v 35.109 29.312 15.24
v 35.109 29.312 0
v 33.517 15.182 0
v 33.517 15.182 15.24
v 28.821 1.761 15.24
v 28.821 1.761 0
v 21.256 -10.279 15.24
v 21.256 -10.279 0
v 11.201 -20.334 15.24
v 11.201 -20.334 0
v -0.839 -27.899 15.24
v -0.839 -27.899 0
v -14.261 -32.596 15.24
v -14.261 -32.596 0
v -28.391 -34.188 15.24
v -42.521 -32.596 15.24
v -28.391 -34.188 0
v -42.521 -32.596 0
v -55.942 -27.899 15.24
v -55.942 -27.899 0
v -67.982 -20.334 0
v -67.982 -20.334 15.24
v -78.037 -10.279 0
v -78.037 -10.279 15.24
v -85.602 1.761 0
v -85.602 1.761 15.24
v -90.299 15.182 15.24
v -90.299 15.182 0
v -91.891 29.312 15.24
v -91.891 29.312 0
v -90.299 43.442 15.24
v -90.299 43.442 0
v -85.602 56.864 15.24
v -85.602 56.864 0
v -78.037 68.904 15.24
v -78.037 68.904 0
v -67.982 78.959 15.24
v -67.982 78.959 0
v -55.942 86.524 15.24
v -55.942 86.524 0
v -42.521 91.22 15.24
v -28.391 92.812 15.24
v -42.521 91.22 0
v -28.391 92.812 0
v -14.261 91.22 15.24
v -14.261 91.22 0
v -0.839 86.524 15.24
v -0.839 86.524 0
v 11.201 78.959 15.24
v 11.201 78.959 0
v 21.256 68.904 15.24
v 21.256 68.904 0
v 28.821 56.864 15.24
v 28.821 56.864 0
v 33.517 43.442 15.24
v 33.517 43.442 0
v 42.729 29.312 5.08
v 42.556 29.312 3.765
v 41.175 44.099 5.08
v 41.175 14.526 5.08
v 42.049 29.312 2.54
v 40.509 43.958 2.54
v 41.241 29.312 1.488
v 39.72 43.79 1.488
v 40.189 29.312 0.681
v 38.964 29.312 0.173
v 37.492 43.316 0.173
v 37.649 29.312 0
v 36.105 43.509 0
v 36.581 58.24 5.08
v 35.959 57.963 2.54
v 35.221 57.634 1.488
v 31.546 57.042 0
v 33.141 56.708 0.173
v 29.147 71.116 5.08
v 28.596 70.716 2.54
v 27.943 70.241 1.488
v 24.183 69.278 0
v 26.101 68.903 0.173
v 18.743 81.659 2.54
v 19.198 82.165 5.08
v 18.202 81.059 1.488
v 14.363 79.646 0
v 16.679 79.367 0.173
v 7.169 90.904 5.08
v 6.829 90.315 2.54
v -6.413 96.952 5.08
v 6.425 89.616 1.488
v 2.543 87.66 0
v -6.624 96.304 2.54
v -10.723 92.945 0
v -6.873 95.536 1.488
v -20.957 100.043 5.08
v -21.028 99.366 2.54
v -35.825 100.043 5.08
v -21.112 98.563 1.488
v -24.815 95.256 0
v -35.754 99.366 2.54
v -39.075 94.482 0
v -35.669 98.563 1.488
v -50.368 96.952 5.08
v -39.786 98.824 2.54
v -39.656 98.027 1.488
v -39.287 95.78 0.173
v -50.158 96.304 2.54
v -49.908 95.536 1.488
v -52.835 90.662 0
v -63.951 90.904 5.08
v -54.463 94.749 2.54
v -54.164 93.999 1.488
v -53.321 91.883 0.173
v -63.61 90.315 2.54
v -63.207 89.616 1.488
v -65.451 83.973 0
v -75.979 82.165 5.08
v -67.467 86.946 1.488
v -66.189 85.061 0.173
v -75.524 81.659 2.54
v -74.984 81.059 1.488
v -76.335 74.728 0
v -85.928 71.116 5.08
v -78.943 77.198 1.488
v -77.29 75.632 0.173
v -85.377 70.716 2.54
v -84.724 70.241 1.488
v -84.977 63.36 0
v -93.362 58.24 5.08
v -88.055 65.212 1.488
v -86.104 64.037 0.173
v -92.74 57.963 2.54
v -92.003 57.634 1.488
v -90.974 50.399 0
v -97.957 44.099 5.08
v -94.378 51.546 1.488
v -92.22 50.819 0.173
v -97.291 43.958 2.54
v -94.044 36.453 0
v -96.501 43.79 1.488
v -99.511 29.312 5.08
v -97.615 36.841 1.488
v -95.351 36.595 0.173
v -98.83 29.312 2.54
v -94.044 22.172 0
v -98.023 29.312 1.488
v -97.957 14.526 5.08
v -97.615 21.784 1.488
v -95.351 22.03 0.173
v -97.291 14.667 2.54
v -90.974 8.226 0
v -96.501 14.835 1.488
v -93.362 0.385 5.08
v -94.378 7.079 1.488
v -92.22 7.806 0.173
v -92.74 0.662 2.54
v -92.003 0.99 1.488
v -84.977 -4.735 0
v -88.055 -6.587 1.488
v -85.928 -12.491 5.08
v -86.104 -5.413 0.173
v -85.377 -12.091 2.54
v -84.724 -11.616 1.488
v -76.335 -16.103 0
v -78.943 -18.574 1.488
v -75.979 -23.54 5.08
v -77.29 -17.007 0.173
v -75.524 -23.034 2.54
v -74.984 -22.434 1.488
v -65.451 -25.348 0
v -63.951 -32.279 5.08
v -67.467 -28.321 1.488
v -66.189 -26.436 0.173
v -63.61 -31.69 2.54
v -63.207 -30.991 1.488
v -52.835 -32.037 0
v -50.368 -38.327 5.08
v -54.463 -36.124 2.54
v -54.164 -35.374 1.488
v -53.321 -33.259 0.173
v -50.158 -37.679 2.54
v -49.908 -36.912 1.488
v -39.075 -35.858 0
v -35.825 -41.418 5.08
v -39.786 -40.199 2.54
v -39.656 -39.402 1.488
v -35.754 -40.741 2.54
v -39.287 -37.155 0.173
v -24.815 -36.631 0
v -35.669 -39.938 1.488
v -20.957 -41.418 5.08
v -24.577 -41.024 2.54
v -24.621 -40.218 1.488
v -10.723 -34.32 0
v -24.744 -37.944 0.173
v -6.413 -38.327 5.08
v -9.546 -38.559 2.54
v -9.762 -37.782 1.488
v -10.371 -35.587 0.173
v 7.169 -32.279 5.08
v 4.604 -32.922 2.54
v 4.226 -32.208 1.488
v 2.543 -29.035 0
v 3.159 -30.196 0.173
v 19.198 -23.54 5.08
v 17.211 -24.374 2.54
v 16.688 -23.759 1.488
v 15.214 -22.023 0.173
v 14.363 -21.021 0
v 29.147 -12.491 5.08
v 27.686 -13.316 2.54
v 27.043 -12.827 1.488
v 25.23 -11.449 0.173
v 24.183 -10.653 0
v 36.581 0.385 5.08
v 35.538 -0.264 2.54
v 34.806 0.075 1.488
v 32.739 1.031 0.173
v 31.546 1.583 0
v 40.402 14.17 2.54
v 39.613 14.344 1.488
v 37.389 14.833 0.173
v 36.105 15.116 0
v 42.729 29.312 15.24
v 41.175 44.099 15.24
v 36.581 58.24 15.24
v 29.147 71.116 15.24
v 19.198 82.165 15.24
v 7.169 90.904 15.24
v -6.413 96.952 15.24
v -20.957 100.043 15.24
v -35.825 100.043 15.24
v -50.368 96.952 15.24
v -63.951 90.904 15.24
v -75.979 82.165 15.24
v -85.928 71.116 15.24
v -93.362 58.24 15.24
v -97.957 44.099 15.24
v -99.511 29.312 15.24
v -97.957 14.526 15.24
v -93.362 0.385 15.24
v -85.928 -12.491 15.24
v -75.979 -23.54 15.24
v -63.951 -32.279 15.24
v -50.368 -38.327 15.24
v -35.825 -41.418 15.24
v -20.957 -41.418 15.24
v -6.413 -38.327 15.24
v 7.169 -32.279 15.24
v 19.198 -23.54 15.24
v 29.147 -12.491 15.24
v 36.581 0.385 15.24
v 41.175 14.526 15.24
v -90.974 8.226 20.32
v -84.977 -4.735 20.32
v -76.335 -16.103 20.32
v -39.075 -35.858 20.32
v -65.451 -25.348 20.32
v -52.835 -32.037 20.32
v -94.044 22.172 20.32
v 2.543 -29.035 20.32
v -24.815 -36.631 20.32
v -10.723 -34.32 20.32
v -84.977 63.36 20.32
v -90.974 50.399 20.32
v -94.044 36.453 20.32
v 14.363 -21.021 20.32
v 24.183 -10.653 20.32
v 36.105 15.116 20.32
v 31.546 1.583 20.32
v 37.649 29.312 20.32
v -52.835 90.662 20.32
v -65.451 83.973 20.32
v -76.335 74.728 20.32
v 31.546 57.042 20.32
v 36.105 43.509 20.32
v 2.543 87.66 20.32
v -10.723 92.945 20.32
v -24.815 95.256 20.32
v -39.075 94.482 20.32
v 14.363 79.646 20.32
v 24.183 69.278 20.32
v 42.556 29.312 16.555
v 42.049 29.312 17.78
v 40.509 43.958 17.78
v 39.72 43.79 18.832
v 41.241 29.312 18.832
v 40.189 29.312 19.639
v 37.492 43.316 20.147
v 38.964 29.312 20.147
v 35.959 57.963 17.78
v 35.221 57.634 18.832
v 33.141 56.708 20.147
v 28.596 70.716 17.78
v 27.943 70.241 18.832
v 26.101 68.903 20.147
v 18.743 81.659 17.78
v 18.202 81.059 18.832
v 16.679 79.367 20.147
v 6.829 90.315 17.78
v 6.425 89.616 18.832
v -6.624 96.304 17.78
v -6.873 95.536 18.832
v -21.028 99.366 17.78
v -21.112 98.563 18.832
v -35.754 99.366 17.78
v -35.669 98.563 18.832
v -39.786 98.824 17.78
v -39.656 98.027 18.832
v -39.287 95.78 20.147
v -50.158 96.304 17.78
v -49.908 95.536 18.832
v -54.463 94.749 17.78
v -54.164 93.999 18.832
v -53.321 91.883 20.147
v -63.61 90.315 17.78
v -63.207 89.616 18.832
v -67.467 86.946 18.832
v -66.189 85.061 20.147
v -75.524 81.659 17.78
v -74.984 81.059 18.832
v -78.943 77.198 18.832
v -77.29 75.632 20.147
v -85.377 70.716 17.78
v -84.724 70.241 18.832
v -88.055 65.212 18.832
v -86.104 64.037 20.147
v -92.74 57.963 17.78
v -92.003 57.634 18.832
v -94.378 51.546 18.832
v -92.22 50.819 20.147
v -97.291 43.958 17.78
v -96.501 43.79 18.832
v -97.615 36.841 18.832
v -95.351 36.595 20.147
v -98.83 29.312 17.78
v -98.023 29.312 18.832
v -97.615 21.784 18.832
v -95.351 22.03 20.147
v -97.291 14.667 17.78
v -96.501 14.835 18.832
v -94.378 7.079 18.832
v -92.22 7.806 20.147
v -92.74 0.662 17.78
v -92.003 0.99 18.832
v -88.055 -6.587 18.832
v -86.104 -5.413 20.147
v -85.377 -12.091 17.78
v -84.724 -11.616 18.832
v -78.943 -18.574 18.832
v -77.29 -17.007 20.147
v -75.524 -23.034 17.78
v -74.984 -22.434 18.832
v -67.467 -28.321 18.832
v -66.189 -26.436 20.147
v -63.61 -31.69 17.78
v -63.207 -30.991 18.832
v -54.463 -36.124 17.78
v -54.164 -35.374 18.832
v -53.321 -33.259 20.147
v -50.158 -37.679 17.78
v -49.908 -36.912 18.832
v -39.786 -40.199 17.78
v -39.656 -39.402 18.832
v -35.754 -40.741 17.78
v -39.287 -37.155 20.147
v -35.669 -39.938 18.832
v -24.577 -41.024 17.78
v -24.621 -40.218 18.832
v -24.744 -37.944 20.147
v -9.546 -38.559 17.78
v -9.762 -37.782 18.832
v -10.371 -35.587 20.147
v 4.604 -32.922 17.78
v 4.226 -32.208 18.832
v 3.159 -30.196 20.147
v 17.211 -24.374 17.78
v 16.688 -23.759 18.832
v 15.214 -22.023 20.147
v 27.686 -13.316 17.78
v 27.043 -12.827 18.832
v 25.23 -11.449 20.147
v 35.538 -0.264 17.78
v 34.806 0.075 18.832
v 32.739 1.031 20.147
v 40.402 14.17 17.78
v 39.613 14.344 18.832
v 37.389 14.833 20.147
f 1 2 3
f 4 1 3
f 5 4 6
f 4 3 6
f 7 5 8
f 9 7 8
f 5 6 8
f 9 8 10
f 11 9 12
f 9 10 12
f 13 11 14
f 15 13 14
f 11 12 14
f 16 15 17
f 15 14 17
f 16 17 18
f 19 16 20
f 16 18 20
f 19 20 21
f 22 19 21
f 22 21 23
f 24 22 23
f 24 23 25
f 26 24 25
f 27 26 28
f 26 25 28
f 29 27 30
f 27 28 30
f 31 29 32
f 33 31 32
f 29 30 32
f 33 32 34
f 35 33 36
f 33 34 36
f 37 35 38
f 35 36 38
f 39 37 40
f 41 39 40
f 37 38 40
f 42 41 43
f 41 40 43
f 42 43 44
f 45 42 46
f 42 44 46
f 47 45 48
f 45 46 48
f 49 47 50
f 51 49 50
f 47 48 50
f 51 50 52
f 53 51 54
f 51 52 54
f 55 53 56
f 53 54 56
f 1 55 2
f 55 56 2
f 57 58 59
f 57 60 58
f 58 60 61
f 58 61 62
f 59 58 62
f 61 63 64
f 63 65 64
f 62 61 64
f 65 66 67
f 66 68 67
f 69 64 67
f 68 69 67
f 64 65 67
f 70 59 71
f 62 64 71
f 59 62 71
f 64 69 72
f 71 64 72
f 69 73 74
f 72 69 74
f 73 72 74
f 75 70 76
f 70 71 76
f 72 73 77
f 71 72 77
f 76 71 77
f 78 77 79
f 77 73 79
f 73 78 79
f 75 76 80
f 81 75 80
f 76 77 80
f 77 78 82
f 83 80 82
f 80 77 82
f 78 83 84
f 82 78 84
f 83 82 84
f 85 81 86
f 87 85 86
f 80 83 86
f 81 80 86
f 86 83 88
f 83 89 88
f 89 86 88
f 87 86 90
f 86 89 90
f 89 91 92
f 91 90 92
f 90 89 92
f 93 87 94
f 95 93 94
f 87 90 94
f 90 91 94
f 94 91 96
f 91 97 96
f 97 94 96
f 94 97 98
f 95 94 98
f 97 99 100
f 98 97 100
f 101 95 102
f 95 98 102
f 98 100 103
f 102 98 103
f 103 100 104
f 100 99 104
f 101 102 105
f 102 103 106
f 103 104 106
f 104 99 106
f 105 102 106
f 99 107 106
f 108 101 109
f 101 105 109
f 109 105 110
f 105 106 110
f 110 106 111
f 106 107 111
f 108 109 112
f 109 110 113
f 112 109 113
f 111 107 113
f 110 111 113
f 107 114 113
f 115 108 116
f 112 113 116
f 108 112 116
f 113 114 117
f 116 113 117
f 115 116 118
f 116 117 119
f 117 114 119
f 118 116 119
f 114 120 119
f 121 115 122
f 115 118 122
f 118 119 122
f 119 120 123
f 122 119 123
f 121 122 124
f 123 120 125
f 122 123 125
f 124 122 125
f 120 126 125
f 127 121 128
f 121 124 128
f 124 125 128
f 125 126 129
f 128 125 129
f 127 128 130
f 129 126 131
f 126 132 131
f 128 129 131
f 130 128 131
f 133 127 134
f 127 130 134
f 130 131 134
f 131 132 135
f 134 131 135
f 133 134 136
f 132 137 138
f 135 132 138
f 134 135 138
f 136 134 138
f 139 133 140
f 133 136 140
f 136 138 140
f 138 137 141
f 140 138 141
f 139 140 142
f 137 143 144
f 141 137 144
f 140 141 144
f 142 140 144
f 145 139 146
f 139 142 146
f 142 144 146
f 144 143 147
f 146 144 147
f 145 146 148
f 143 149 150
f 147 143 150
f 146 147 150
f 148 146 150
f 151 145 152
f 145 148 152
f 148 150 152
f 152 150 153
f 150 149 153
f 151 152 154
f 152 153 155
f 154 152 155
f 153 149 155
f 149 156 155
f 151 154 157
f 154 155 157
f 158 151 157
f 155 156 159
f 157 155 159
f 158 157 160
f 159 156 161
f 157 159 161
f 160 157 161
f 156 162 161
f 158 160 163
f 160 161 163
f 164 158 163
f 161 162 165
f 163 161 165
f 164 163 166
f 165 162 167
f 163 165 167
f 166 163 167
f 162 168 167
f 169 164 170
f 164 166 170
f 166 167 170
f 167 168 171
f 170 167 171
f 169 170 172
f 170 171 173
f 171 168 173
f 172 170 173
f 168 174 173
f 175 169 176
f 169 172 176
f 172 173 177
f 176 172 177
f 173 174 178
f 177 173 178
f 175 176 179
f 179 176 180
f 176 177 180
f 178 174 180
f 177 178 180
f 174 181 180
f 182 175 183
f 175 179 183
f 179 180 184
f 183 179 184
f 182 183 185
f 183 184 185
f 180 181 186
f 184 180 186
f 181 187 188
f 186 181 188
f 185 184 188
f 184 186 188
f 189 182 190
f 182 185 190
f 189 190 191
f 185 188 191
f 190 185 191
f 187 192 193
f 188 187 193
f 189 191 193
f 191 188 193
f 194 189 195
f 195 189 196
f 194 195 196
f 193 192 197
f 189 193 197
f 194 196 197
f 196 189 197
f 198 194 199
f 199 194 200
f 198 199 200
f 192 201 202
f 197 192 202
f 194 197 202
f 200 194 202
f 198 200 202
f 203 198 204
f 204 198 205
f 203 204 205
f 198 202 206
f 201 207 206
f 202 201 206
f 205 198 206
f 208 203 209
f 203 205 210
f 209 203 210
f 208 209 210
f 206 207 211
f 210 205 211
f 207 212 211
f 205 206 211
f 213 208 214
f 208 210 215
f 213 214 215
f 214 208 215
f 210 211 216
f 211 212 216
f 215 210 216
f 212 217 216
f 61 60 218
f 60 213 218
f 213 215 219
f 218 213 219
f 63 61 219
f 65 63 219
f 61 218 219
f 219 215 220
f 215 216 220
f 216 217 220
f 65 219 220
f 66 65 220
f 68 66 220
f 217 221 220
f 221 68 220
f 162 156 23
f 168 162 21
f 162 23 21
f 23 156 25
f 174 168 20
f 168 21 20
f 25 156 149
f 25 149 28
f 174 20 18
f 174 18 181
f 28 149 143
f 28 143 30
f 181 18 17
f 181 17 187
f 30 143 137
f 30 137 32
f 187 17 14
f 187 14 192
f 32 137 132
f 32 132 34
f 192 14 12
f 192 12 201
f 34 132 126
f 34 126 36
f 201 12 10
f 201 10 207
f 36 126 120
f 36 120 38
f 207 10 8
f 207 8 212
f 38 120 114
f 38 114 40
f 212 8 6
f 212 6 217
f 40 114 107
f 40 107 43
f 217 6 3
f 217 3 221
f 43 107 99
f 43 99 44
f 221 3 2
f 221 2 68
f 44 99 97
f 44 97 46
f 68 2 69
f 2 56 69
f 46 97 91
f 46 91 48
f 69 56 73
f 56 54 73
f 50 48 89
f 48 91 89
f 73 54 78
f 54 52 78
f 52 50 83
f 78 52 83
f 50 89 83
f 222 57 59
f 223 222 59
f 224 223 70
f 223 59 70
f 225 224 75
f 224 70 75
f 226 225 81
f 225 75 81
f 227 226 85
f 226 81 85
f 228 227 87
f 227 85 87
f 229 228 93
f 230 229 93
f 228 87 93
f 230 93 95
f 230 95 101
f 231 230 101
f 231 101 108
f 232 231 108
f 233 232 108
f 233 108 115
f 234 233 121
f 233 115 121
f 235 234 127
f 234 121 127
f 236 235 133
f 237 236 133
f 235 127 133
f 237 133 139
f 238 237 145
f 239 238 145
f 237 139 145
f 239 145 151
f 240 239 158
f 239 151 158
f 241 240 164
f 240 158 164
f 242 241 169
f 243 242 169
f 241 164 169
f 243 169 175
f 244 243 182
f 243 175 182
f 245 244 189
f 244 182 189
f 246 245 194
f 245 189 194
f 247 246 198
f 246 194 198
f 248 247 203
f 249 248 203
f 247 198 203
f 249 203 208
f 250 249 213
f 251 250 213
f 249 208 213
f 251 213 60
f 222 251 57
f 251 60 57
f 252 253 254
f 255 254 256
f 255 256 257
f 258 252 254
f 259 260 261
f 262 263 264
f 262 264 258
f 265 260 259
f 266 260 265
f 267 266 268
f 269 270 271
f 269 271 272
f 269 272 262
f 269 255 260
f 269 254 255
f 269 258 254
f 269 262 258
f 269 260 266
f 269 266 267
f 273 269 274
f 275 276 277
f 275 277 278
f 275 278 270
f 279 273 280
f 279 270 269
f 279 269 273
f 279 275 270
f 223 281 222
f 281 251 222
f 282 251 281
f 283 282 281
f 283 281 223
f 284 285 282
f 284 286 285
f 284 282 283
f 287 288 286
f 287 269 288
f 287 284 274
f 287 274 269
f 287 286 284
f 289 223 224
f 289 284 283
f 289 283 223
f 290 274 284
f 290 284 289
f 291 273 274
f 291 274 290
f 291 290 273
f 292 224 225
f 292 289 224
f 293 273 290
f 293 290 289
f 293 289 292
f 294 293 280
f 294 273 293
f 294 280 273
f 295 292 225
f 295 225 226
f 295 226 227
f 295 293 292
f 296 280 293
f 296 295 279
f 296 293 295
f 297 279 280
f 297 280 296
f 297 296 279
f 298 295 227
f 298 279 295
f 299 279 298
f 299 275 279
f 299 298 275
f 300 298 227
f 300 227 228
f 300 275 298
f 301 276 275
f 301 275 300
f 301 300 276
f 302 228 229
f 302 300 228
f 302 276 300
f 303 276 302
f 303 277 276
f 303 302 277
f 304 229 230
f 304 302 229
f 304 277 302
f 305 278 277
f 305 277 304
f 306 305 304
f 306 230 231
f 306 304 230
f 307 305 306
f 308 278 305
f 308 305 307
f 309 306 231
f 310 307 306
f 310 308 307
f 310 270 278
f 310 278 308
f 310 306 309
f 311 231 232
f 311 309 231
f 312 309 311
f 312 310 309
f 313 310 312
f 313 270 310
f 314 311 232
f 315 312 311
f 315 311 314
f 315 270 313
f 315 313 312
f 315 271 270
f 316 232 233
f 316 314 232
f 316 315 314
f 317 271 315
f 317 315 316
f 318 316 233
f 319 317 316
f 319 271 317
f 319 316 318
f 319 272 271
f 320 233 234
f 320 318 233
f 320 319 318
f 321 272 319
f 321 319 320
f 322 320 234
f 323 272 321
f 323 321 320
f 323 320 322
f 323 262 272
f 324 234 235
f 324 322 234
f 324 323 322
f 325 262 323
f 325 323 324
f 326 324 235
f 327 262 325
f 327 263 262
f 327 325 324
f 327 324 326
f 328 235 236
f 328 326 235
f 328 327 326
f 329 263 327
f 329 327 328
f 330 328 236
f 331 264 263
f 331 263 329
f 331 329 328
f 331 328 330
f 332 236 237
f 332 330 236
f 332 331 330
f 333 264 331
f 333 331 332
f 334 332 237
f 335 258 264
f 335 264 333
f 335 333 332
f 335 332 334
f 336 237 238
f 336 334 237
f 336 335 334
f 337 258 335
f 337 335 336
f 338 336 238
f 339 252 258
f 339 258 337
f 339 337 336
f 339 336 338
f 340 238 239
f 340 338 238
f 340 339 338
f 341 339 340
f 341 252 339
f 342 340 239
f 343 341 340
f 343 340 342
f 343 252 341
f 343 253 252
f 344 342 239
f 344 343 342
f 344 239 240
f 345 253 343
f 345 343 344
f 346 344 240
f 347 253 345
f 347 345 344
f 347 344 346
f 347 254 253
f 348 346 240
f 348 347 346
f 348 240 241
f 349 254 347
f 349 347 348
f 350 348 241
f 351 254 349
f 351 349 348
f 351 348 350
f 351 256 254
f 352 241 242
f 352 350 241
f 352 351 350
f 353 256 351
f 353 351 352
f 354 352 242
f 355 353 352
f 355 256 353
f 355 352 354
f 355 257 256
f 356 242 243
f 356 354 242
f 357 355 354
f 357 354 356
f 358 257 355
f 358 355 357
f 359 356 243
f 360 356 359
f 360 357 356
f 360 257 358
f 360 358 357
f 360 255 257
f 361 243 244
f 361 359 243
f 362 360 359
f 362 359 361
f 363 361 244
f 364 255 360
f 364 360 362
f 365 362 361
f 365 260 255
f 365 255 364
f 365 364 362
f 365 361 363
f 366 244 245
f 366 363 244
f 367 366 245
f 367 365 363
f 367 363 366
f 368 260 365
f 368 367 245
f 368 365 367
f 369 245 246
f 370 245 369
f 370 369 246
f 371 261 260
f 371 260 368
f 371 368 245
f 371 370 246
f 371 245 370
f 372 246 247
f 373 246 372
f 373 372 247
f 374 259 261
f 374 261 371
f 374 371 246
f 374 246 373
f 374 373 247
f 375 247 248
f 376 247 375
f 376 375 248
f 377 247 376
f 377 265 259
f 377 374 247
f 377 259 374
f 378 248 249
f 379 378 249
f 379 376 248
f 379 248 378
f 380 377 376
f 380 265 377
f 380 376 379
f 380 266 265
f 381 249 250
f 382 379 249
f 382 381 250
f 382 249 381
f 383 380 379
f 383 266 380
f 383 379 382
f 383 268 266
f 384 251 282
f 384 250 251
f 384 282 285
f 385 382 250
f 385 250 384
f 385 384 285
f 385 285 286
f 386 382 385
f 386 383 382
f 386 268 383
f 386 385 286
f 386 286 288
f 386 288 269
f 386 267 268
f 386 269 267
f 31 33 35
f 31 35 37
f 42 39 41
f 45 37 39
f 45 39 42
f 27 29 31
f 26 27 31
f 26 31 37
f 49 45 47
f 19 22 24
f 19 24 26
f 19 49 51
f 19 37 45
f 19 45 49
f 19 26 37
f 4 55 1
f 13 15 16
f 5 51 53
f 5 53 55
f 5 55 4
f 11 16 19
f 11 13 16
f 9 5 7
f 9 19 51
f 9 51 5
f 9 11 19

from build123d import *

# Parameters (mm, degrees)
F0_R     = 71.12
F1_DEPTH = 20.32
F2_R     = 63.5
F3_DEPTH = 15.24
F4_R     = 5.08


with BuildPart() as f1:
    # F0 (on Top) → F1 (new body)
    with BuildSketch(Plane.XY):
        with Locations((-28.390646, 29.312419)):
            Circle(F0_R)
    extrude(amount=F1_DEPTH)

    # F2 (on face) → F3 (cut)
    with BuildSketch(Plane(origin=(0, 0, 0), x_dir=(1, 0, 0), z_dir=(0, 0, -1))):
        with Locations((-28.390646, -29.312419)):
            Circle(F2_R)
    extrude(amount=-F3_DEPTH, mode=Mode.SUBTRACT)

    # F4
    f4_edges = [f1.edges().sort_by_distance(p)[0] for p in [
        (-99.510646, 29.312419, 20.32),
        (-99.510646, 29.312419, 0),
    ]]
    fillet(f4_edges, radius=F4_R)


solid = f1.part
